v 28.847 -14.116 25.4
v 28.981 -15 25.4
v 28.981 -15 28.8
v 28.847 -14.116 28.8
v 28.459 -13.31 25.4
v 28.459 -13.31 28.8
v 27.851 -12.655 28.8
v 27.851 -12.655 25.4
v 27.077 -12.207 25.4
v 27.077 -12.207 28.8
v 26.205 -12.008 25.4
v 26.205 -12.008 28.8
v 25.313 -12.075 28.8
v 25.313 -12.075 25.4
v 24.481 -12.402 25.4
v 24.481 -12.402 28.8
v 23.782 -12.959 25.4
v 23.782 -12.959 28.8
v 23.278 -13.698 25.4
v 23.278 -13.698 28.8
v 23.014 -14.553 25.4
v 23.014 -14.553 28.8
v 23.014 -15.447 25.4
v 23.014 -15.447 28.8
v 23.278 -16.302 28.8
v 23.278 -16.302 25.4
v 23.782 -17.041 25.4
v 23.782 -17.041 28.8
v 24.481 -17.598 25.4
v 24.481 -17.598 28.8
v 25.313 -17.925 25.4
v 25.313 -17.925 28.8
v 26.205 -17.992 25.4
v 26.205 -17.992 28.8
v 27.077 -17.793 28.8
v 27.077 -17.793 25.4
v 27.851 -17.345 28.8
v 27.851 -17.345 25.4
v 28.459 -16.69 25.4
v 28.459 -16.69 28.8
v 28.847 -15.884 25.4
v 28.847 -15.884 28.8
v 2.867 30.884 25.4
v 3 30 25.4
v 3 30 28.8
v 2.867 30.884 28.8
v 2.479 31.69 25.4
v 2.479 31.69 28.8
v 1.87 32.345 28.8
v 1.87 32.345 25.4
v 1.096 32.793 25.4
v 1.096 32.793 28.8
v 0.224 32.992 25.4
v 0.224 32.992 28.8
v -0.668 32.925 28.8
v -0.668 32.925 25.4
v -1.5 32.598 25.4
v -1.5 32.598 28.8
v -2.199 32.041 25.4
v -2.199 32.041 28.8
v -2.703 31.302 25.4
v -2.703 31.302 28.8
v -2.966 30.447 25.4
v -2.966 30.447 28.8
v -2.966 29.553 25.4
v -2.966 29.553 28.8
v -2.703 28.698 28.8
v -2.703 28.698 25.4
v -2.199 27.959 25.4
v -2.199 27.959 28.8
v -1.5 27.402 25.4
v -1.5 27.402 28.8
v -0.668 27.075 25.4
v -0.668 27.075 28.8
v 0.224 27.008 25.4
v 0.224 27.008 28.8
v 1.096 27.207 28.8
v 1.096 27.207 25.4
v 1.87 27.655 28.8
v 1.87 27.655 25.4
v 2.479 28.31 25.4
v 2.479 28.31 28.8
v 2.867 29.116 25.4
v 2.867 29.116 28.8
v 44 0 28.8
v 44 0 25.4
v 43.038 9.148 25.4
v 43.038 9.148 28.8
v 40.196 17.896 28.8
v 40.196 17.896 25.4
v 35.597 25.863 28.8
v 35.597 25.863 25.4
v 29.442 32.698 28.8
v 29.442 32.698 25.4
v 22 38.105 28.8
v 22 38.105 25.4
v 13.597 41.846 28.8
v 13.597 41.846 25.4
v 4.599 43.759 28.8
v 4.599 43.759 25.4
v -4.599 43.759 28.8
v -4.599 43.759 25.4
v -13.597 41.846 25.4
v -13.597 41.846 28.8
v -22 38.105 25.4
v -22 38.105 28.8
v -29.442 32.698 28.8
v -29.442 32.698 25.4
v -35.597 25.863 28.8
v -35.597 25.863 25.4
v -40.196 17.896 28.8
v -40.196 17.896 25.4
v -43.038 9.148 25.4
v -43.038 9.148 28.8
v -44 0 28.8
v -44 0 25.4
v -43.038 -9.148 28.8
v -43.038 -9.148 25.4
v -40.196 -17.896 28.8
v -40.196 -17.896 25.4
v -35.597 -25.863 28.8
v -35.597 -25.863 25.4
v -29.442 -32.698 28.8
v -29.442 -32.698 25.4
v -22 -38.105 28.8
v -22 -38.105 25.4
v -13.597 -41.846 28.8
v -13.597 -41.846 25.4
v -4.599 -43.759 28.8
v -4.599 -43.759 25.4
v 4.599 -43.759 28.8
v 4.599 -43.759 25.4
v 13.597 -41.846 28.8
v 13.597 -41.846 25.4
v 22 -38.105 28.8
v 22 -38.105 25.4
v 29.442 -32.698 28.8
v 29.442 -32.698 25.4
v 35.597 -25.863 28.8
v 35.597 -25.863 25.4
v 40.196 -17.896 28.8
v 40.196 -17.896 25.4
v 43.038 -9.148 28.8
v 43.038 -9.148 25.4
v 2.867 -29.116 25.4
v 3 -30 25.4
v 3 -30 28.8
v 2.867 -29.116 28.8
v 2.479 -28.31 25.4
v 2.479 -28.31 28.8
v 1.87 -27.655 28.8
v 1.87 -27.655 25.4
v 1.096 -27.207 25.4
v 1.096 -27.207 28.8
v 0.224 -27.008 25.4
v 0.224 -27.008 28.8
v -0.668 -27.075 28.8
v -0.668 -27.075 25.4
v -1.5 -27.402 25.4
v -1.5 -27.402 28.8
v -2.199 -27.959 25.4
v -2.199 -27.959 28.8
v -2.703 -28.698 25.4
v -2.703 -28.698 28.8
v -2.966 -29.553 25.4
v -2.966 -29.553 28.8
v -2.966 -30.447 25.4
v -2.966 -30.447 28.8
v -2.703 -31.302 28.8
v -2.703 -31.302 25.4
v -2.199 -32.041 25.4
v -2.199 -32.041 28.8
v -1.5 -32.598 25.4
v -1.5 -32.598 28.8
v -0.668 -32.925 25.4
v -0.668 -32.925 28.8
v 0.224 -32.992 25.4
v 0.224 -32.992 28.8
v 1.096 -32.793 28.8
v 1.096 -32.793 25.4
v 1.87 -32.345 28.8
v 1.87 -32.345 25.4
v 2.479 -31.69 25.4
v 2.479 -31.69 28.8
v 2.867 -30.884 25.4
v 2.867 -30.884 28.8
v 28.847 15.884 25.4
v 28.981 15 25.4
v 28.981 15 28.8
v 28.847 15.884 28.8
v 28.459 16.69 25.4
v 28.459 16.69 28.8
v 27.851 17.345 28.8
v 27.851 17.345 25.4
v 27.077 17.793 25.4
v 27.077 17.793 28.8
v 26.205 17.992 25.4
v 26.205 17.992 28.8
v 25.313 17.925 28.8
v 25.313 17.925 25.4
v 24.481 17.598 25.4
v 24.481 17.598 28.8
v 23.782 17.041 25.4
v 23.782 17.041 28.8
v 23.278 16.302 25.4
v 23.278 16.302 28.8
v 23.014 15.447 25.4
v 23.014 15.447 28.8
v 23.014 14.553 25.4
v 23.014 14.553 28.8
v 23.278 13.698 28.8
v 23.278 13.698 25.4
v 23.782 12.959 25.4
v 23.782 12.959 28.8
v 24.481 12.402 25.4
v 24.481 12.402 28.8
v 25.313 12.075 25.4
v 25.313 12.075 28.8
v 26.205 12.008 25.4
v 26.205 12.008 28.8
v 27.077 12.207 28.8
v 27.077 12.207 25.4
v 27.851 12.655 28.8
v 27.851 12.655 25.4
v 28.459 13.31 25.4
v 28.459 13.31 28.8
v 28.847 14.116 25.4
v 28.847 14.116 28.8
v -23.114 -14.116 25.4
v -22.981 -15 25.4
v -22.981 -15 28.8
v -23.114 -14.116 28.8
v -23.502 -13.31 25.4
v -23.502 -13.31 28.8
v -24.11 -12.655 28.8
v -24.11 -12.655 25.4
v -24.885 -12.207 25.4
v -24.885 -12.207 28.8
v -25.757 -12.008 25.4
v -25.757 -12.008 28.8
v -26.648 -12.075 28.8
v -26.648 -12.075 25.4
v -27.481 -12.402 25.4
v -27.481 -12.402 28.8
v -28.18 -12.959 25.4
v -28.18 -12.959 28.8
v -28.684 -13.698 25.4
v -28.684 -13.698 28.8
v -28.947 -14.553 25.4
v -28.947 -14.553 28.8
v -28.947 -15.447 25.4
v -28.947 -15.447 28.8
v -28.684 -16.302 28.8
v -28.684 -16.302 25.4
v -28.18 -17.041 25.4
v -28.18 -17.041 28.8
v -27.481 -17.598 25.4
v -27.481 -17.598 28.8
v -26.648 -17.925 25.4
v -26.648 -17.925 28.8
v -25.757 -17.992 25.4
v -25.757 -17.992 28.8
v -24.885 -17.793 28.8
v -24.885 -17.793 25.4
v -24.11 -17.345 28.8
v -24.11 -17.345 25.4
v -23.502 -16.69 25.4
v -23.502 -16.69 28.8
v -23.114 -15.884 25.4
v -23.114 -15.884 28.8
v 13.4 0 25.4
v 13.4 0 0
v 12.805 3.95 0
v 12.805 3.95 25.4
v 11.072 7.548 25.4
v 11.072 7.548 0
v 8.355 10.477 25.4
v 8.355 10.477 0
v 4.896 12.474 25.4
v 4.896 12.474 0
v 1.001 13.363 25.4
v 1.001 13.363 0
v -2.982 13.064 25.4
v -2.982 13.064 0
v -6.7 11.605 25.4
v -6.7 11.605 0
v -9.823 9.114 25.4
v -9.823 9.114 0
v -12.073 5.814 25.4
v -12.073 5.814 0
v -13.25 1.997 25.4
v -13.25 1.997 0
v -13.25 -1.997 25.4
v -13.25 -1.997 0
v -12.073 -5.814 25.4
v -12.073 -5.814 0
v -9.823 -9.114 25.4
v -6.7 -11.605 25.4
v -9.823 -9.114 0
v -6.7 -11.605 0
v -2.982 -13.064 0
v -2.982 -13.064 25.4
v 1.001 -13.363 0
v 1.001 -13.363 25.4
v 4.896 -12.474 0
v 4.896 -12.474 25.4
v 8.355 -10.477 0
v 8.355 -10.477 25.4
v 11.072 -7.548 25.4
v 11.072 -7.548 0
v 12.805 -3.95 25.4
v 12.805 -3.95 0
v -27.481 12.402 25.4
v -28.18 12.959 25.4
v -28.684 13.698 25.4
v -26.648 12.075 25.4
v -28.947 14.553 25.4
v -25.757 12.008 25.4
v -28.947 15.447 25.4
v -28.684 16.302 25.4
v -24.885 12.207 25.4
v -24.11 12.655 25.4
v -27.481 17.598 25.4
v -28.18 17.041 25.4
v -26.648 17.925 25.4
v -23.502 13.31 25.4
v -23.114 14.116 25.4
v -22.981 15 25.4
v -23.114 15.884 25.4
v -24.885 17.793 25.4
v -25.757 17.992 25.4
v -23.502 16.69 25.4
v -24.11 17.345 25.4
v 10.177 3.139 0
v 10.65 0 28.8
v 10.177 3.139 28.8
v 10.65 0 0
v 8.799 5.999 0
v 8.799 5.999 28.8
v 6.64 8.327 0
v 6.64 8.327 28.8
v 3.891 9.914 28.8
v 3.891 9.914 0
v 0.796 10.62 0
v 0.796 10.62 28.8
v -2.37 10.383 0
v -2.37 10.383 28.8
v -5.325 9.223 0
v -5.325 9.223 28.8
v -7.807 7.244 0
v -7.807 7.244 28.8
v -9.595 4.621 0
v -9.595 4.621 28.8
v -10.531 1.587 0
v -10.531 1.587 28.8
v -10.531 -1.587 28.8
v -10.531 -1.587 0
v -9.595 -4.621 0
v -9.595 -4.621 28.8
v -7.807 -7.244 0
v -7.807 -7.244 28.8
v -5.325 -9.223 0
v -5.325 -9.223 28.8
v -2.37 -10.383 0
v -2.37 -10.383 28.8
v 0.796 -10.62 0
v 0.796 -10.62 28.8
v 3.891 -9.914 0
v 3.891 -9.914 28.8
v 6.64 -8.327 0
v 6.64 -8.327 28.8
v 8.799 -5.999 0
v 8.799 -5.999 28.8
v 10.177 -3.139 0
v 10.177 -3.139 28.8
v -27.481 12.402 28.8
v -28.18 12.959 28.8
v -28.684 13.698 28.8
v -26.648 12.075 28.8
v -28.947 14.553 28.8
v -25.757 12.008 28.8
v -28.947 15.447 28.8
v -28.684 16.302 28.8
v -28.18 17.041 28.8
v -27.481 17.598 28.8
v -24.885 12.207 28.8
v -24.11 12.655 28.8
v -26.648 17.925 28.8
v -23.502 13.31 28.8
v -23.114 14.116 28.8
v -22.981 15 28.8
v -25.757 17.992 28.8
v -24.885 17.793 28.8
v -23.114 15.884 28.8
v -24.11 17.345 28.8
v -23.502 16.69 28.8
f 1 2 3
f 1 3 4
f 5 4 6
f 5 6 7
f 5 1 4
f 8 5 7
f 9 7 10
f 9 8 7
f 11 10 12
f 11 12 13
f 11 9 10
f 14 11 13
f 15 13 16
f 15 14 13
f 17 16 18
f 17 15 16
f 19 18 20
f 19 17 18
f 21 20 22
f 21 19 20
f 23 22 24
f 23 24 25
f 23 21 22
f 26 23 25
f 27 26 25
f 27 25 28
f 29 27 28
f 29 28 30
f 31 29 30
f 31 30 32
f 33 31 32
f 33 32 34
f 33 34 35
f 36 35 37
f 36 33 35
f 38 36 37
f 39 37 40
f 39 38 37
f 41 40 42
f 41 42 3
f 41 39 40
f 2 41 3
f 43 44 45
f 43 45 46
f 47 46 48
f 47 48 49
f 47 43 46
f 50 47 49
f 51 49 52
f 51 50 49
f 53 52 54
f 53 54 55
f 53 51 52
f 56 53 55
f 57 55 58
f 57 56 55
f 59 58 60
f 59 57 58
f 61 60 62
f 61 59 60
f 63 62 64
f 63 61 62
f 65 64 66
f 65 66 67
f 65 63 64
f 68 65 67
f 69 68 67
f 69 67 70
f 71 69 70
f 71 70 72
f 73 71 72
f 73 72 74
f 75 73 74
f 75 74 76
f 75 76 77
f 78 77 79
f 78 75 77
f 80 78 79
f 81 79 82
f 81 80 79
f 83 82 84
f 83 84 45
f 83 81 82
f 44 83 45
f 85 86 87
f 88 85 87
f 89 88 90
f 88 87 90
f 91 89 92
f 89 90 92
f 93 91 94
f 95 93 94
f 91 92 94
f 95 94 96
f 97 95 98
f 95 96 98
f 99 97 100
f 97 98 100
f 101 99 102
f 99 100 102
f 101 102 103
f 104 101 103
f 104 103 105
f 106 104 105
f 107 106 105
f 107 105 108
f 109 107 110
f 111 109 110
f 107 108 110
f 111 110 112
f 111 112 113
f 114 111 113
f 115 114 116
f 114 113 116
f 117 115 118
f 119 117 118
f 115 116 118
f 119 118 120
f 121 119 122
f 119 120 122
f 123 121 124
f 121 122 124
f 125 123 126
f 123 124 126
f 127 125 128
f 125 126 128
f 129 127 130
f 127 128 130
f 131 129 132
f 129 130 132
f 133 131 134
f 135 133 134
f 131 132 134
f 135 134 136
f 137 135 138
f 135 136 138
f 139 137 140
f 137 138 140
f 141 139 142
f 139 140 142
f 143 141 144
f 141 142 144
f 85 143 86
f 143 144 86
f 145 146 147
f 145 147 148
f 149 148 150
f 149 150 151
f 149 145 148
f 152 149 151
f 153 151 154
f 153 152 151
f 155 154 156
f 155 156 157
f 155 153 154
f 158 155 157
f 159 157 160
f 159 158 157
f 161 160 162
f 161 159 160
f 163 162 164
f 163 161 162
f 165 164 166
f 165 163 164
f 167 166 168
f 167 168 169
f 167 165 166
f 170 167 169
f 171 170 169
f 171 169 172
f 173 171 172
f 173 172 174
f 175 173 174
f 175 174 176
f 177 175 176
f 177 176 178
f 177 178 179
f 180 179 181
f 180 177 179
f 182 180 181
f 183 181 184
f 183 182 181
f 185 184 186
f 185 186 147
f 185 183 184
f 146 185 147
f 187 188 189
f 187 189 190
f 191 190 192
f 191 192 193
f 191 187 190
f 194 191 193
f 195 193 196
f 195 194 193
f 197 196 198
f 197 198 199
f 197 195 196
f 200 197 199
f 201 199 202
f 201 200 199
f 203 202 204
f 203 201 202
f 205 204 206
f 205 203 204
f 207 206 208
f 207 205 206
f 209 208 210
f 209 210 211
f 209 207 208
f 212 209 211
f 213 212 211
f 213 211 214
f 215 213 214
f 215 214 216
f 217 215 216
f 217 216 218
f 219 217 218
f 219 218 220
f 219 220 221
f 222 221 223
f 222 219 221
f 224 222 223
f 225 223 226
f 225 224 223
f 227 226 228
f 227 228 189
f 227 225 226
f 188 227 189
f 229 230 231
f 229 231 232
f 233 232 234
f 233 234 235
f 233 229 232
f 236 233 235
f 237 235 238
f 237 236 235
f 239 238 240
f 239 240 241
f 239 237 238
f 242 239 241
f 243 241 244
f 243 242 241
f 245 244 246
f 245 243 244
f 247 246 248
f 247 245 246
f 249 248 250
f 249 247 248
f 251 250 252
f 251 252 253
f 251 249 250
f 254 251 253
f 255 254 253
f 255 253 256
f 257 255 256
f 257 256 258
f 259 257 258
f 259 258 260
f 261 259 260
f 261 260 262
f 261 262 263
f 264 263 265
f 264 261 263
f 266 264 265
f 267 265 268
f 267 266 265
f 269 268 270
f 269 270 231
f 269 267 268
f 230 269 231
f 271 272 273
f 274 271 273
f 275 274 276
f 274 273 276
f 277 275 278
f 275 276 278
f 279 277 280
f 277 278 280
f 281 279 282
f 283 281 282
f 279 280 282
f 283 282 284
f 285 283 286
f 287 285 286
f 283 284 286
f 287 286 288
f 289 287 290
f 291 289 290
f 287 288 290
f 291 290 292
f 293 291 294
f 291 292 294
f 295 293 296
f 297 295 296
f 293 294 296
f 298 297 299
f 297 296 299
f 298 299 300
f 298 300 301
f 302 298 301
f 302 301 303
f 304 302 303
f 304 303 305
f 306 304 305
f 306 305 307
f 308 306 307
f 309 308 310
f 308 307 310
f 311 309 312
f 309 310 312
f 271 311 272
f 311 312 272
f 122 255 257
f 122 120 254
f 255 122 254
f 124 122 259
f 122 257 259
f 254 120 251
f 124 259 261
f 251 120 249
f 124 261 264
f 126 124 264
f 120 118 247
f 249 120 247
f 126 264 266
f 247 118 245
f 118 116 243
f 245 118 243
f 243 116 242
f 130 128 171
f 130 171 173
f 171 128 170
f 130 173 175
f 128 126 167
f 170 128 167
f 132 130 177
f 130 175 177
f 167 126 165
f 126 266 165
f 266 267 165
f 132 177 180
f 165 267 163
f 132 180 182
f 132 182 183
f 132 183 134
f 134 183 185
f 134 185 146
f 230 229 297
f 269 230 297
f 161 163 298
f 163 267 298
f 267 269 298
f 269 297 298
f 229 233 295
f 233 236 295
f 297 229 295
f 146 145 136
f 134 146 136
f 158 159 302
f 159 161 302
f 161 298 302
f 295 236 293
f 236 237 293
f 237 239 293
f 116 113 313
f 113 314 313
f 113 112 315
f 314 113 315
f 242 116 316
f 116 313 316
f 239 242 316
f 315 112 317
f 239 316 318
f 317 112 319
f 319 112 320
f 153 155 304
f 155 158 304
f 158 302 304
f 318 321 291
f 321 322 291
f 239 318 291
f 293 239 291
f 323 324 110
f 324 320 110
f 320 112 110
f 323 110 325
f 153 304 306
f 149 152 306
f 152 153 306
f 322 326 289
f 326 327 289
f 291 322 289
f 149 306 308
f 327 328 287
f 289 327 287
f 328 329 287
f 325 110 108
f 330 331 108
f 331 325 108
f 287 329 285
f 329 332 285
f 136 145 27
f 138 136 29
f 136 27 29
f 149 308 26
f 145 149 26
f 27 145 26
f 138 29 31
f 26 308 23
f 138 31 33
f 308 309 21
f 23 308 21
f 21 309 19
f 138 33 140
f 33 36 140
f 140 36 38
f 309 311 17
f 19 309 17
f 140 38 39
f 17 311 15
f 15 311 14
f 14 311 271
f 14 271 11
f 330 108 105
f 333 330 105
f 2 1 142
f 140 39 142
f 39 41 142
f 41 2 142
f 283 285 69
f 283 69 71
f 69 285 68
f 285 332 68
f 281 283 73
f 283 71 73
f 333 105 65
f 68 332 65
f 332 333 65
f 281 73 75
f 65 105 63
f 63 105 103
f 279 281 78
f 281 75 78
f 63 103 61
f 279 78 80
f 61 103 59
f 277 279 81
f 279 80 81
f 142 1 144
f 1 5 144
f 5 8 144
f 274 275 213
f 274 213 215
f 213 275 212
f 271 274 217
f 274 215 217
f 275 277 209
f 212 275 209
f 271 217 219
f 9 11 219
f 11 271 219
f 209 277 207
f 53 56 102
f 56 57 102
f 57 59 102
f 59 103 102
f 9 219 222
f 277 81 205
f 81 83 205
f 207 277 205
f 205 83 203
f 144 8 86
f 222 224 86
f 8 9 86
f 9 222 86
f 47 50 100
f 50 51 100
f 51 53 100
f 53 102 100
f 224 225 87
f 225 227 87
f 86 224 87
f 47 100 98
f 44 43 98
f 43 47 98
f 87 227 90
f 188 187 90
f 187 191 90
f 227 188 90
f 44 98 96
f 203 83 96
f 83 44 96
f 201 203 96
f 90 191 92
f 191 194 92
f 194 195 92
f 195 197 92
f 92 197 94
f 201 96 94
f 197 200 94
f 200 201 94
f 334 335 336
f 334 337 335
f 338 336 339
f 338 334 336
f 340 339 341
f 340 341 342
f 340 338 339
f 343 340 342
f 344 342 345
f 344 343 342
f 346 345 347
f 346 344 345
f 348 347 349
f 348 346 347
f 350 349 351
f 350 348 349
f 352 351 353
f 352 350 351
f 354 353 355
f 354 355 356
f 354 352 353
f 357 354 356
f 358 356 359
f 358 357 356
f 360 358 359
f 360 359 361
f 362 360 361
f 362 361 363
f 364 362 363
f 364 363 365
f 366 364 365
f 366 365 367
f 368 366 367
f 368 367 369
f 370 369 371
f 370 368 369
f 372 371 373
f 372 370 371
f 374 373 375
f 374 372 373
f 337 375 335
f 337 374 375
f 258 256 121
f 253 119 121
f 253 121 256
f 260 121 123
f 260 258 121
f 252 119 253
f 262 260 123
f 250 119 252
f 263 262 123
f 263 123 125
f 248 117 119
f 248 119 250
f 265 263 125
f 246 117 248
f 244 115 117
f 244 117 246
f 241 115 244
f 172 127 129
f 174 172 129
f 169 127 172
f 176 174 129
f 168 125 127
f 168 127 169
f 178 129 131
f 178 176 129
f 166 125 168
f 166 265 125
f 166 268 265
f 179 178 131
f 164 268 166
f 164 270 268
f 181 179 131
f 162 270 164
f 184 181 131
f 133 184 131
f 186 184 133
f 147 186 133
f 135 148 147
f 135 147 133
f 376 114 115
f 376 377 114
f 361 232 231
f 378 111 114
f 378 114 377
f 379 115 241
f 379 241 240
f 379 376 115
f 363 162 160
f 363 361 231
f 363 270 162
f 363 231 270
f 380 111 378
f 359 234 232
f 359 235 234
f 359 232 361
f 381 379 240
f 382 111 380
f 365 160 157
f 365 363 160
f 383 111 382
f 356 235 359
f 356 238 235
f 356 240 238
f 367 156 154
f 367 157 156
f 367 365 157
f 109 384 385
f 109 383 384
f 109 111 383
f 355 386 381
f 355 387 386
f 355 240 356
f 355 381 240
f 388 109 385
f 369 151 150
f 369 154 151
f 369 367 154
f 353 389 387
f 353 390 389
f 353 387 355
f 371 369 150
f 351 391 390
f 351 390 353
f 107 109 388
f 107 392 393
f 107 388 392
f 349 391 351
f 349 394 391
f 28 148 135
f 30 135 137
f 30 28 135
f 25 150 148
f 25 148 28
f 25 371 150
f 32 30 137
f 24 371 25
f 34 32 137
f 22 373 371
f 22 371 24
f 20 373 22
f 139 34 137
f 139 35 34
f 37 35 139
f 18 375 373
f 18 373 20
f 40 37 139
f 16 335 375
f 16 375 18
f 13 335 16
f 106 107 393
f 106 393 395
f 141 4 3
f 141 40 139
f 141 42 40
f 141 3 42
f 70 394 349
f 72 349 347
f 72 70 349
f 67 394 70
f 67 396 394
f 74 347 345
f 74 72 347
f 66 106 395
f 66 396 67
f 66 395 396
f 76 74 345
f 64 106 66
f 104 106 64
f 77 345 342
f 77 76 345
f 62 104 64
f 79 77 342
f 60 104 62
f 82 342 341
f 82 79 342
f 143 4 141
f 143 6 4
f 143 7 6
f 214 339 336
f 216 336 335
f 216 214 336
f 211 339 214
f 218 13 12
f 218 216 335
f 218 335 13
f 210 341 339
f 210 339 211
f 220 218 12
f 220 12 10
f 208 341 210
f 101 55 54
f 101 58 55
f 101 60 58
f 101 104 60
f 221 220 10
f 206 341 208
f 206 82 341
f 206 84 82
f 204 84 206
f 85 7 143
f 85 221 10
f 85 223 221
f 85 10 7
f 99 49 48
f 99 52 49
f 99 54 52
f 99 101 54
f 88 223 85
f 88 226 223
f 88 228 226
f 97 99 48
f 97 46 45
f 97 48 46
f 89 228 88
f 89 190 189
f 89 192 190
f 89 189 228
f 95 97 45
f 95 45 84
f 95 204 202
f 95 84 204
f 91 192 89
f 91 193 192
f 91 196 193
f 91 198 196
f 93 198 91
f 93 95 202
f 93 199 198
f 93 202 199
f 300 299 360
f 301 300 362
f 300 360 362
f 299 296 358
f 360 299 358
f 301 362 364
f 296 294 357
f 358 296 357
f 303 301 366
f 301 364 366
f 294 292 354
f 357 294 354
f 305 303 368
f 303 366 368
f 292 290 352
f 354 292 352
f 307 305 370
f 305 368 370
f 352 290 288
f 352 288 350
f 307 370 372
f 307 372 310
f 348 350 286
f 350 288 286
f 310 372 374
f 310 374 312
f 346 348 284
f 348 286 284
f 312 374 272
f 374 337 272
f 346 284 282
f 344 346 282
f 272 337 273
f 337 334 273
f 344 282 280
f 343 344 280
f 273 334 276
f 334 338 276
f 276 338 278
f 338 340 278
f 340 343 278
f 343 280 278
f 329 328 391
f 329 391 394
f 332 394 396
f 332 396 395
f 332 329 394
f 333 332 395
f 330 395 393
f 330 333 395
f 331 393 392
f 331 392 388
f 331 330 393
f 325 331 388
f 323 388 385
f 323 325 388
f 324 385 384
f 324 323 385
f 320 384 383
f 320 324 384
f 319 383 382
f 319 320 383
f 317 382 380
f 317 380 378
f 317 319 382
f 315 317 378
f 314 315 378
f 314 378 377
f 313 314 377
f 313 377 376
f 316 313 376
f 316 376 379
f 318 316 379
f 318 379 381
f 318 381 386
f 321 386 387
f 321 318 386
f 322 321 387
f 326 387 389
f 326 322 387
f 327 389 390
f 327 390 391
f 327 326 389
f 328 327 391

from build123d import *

# Parameters (mm, degrees)
CROQUIS1_R              = 13.4
CROQUIS1_R_2            = 10.65
SALIENTE_EXTRUIR1_DEPTH = 25.4
CROQUIS2_R              = 44
CROQUIS2_R_2            = 10.65
CROQUIS2_R_3            = 3
SALIENTE_EXTRUIR2_DEPTH = 3.4


with BuildPart() as part:
    # Croquis1 → Saliente-Extruir1 (new body)
    with BuildSketch(Plane.XY):
        Circle(CROQUIS1_R)
        Circle(CROQUIS1_R_2, mode=Mode.SUBTRACT)
    extrude(amount=SALIENTE_EXTRUIR1_DEPTH)

    # Croquis2 → Saliente-Extruir2 (add)
    with BuildSketch(Plane.XY.offset(25.4)):
        Circle(CROQUIS2_R)
        Circle(CROQUIS2_R_2, mode=Mode.SUBTRACT)
        with Locations((0, 30)):
            Circle(CROQUIS2_R_3, mode=Mode.SUBTRACT)
        with Locations((25.980762114, 15)):
            Circle(CROQUIS2_R_3, mode=Mode.SUBTRACT)
        with Locations((25.980762114, -15)):
            Circle(CROQUIS2_R_3, mode=Mode.SUBTRACT)
        with Locations((0, -30)):
            Circle(CROQUIS2_R_3, mode=Mode.SUBTRACT)
        with Locations((-25.980762114, -15)):
            Circle(CROQUIS2_R_3, mode=Mode.SUBTRACT)
        with Locations((-25.980762114, 15)):
            Circle(CROQUIS2_R_3, mode=Mode.SUBTRACT)
    extrude(amount=SALIENTE_EXTRUIR2_DEPTH)


solid = part.part
